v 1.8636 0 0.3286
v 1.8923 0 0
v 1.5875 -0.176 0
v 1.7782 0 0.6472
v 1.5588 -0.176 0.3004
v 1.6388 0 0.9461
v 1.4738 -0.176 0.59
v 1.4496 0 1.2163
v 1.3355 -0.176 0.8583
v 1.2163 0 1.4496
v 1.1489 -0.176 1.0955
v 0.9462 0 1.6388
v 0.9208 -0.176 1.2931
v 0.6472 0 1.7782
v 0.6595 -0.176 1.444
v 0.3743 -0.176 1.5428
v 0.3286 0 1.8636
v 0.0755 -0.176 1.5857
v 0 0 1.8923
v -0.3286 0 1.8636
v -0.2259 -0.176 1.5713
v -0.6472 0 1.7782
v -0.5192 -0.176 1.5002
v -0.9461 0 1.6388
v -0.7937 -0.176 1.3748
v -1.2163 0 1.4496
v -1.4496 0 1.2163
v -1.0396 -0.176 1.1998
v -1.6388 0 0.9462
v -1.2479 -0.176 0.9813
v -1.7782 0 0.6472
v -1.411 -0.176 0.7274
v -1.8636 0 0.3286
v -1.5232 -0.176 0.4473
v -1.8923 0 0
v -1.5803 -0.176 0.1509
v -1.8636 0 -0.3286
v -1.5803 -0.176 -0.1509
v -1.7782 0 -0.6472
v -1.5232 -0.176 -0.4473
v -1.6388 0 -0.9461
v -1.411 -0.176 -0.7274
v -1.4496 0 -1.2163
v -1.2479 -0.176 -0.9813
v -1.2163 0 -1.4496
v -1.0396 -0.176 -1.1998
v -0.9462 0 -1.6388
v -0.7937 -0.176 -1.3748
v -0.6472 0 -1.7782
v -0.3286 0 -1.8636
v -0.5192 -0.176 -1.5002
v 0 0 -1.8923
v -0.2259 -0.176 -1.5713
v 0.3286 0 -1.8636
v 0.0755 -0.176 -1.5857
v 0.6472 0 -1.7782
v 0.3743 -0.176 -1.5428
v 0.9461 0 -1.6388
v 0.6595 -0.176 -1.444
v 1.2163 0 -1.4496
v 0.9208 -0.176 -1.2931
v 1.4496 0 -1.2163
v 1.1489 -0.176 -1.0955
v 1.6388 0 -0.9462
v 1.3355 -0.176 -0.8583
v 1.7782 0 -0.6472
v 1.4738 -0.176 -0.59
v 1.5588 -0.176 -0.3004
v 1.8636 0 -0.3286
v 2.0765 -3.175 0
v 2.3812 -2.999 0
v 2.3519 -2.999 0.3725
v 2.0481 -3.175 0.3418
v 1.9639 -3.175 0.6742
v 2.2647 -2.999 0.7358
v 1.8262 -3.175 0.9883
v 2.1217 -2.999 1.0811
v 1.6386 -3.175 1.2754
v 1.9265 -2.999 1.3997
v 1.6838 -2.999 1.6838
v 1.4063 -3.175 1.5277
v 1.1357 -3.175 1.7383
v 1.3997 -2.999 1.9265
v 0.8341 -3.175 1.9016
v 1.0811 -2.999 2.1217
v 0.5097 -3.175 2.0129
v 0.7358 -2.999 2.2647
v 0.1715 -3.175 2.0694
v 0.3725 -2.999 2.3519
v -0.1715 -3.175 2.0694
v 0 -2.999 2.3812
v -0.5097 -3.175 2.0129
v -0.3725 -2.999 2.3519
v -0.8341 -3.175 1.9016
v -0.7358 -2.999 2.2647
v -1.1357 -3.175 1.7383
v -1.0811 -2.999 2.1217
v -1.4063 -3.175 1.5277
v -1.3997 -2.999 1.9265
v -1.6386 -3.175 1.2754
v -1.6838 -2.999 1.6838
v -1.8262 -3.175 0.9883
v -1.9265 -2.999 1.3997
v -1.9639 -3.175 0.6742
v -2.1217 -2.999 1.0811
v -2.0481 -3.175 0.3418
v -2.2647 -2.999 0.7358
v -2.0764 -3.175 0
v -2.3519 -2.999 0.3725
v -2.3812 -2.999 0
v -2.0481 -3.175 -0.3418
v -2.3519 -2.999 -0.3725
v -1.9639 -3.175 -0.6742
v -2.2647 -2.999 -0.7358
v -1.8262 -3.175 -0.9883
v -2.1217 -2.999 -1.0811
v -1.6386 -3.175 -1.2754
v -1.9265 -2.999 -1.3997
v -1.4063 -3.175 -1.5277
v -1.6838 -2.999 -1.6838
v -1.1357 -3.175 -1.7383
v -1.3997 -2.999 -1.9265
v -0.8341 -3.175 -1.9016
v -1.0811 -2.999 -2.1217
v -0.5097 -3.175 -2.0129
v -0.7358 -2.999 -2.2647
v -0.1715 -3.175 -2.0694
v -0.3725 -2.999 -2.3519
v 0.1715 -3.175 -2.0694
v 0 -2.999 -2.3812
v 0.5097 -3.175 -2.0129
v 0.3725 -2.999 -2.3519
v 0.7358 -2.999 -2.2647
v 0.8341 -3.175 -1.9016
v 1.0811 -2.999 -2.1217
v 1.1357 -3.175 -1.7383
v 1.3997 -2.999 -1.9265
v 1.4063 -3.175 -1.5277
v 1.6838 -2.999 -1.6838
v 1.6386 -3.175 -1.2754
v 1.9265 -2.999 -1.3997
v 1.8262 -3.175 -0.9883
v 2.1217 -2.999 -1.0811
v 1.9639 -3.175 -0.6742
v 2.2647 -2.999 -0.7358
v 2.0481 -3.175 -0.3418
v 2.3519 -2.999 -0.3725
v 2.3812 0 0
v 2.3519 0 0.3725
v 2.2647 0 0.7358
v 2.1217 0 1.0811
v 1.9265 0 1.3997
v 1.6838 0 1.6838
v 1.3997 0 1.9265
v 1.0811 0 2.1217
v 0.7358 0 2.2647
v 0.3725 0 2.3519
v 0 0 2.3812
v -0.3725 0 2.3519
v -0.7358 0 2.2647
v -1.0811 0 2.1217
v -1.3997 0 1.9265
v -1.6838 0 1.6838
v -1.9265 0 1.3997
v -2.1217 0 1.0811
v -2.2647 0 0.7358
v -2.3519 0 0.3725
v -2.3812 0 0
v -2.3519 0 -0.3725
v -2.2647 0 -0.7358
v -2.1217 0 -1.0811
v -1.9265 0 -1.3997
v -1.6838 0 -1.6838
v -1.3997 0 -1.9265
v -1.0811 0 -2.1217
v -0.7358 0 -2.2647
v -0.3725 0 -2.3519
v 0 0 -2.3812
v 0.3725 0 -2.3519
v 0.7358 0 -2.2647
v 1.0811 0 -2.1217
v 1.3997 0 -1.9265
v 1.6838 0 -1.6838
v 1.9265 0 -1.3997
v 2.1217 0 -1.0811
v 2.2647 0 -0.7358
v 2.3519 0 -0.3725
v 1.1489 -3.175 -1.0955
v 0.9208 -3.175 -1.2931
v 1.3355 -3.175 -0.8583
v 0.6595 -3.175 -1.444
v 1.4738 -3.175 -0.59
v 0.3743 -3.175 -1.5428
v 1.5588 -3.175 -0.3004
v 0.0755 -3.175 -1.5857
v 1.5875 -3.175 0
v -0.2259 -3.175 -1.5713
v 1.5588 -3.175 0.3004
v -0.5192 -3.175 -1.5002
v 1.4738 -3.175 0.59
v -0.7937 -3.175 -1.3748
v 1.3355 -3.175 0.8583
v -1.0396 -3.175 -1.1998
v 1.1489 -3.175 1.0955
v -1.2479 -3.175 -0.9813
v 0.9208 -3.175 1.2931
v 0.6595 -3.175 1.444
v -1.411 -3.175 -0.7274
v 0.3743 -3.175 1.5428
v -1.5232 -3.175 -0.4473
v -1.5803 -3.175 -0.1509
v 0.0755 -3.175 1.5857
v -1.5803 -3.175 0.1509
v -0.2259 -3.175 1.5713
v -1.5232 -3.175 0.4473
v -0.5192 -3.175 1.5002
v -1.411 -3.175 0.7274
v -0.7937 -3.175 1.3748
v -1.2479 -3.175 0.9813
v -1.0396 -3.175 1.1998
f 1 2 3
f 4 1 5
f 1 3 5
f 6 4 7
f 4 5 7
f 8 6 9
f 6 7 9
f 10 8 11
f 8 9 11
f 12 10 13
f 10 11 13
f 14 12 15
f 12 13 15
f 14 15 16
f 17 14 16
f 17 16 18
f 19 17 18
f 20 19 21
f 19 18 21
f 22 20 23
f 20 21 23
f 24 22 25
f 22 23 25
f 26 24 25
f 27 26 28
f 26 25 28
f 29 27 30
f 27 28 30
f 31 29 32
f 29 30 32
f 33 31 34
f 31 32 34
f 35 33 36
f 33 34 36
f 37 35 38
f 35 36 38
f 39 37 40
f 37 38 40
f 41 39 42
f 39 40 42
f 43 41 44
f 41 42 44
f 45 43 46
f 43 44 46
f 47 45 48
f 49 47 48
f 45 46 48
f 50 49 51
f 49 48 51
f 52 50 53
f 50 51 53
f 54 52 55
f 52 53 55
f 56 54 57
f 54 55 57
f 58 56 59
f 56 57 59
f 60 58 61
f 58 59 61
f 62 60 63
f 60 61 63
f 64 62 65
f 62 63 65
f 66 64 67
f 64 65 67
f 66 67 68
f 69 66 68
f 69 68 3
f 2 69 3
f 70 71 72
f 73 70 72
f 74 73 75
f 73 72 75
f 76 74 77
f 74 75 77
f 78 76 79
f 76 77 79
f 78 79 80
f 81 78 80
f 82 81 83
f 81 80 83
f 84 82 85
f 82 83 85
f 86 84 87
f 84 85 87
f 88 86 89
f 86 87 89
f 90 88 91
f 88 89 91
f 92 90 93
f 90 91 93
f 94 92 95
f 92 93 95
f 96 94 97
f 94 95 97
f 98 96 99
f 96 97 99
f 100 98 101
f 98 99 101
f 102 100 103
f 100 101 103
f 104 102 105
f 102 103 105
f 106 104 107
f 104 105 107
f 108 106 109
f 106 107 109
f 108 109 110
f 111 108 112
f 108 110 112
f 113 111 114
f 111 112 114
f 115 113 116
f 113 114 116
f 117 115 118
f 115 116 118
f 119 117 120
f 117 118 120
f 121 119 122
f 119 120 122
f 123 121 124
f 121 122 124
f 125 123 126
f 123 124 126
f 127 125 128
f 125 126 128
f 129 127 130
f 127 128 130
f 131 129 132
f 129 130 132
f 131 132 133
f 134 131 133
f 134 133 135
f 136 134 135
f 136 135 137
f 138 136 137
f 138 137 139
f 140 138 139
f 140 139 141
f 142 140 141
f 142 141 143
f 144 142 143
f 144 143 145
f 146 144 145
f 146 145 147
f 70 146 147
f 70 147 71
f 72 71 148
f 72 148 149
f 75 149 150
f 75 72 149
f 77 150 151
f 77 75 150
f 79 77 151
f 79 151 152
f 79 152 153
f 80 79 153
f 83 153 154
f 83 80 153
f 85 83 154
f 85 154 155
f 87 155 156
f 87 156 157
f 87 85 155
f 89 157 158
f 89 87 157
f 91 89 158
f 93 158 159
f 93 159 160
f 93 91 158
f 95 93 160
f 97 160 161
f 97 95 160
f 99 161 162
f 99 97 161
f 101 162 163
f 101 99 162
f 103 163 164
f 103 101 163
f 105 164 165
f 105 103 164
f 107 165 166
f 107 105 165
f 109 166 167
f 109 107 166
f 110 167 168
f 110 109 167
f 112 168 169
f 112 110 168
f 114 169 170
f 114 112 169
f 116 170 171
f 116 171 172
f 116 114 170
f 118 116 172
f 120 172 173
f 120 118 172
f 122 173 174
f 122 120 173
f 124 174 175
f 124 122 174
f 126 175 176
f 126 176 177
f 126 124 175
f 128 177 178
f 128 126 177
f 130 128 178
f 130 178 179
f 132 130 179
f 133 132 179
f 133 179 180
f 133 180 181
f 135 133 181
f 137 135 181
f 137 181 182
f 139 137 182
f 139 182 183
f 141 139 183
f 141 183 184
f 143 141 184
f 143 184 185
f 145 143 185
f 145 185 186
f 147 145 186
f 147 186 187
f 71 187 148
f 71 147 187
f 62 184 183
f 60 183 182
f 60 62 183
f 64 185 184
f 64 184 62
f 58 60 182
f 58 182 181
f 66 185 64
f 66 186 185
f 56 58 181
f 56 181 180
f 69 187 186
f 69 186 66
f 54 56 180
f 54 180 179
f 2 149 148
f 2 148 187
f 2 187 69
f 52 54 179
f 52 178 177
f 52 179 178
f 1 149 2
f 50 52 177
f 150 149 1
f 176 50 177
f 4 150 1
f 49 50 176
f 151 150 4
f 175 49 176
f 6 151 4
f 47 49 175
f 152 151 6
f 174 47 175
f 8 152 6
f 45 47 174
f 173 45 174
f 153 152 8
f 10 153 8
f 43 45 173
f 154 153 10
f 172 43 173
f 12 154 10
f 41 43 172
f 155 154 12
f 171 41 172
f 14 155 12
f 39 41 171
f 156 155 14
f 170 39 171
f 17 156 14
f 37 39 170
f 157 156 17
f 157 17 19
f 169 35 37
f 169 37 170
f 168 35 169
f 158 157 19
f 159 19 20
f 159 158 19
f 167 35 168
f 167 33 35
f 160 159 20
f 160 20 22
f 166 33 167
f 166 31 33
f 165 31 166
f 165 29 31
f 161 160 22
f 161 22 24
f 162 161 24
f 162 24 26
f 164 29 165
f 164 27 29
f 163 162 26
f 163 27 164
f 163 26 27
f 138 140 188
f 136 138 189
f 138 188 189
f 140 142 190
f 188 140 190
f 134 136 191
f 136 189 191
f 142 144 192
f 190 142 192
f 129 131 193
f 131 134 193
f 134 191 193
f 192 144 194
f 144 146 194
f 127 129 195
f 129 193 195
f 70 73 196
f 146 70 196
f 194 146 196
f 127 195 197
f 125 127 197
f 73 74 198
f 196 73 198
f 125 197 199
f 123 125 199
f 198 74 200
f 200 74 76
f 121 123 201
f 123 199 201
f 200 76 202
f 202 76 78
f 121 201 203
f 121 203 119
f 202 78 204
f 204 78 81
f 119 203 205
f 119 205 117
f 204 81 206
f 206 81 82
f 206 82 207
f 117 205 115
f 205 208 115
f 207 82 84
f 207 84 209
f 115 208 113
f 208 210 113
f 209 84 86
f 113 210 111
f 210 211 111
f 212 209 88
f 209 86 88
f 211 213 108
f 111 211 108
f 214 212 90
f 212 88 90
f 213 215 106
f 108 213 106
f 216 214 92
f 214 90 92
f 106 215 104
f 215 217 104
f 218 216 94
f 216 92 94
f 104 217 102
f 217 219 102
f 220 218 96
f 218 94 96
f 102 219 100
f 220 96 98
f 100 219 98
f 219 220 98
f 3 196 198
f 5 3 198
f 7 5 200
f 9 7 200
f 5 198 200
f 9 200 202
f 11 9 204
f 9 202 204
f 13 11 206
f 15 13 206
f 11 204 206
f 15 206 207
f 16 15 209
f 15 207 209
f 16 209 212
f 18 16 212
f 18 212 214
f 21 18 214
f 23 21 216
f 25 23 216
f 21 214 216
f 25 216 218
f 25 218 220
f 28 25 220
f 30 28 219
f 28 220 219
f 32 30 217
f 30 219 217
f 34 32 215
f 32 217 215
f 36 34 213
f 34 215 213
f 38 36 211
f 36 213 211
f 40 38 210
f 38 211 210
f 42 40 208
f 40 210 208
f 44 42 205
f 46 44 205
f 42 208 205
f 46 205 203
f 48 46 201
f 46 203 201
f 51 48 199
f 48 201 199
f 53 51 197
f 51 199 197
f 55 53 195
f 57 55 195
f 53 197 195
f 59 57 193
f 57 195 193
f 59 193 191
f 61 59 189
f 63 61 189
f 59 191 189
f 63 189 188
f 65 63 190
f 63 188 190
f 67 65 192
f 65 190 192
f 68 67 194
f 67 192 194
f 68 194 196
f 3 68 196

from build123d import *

# Parameters (mm, degrees)
SKETCH1_W             = 0.79375
SKETCH1_H             = 3.175
CHAMFER1_SIZE         = 0.3048
CHAMFER1_SIZE2        = 0.175976362
CHAMFER1_PART_2_SIZE  = 0.3048
CHAMFER1_PART_2_SIZE2 = 0.175976362


with BuildPart() as part:
    # Sketch1 → Revolve1 (revolve)
    with BuildSketch(Plane(origin=(0, 0, 0), x_dir=(1, 0, 0), z_dir=(0, 0, -1))):
        with Locations((1.984375, 1.5875)):
            Rectangle(SKETCH1_W, SKETCH1_H)
    revolve(axis=Axis((0, 0, 0), (0, -1, 0)))

    # Chamfer1
    chamfer1_edges = [part.edges().sort_by_distance(p)[0] for p in [
        (-1.5875, 0, 0),
    ]]
    chamfer1_side = [part.faces().sort_by_distance(p)[0] for p in [
        (-2.313898079, 0, 0),
    ]]
    chamfer(chamfer1_edges, length=CHAMFER1_SIZE, length2=CHAMFER1_SIZE2, reference=chamfer1_side[0])

    # Chamfer1 part 2
    chamfer1_part_2_edges = [part.edges().sort_by_distance(p)[0] for p in [
        (-2.38125, -3.175, 0),
    ]]
    chamfer1_part_2_side = [part.faces().sort_by_distance(p)[0] for p in [
        (-1.654851921, -3.175, 0),
    ]]
    chamfer(chamfer1_part_2_edges, length=CHAMFER1_PART_2_SIZE, length2=CHAMFER1_PART_2_SIZE2, reference=chamfer1_part_2_side[0])


solid = part.part
